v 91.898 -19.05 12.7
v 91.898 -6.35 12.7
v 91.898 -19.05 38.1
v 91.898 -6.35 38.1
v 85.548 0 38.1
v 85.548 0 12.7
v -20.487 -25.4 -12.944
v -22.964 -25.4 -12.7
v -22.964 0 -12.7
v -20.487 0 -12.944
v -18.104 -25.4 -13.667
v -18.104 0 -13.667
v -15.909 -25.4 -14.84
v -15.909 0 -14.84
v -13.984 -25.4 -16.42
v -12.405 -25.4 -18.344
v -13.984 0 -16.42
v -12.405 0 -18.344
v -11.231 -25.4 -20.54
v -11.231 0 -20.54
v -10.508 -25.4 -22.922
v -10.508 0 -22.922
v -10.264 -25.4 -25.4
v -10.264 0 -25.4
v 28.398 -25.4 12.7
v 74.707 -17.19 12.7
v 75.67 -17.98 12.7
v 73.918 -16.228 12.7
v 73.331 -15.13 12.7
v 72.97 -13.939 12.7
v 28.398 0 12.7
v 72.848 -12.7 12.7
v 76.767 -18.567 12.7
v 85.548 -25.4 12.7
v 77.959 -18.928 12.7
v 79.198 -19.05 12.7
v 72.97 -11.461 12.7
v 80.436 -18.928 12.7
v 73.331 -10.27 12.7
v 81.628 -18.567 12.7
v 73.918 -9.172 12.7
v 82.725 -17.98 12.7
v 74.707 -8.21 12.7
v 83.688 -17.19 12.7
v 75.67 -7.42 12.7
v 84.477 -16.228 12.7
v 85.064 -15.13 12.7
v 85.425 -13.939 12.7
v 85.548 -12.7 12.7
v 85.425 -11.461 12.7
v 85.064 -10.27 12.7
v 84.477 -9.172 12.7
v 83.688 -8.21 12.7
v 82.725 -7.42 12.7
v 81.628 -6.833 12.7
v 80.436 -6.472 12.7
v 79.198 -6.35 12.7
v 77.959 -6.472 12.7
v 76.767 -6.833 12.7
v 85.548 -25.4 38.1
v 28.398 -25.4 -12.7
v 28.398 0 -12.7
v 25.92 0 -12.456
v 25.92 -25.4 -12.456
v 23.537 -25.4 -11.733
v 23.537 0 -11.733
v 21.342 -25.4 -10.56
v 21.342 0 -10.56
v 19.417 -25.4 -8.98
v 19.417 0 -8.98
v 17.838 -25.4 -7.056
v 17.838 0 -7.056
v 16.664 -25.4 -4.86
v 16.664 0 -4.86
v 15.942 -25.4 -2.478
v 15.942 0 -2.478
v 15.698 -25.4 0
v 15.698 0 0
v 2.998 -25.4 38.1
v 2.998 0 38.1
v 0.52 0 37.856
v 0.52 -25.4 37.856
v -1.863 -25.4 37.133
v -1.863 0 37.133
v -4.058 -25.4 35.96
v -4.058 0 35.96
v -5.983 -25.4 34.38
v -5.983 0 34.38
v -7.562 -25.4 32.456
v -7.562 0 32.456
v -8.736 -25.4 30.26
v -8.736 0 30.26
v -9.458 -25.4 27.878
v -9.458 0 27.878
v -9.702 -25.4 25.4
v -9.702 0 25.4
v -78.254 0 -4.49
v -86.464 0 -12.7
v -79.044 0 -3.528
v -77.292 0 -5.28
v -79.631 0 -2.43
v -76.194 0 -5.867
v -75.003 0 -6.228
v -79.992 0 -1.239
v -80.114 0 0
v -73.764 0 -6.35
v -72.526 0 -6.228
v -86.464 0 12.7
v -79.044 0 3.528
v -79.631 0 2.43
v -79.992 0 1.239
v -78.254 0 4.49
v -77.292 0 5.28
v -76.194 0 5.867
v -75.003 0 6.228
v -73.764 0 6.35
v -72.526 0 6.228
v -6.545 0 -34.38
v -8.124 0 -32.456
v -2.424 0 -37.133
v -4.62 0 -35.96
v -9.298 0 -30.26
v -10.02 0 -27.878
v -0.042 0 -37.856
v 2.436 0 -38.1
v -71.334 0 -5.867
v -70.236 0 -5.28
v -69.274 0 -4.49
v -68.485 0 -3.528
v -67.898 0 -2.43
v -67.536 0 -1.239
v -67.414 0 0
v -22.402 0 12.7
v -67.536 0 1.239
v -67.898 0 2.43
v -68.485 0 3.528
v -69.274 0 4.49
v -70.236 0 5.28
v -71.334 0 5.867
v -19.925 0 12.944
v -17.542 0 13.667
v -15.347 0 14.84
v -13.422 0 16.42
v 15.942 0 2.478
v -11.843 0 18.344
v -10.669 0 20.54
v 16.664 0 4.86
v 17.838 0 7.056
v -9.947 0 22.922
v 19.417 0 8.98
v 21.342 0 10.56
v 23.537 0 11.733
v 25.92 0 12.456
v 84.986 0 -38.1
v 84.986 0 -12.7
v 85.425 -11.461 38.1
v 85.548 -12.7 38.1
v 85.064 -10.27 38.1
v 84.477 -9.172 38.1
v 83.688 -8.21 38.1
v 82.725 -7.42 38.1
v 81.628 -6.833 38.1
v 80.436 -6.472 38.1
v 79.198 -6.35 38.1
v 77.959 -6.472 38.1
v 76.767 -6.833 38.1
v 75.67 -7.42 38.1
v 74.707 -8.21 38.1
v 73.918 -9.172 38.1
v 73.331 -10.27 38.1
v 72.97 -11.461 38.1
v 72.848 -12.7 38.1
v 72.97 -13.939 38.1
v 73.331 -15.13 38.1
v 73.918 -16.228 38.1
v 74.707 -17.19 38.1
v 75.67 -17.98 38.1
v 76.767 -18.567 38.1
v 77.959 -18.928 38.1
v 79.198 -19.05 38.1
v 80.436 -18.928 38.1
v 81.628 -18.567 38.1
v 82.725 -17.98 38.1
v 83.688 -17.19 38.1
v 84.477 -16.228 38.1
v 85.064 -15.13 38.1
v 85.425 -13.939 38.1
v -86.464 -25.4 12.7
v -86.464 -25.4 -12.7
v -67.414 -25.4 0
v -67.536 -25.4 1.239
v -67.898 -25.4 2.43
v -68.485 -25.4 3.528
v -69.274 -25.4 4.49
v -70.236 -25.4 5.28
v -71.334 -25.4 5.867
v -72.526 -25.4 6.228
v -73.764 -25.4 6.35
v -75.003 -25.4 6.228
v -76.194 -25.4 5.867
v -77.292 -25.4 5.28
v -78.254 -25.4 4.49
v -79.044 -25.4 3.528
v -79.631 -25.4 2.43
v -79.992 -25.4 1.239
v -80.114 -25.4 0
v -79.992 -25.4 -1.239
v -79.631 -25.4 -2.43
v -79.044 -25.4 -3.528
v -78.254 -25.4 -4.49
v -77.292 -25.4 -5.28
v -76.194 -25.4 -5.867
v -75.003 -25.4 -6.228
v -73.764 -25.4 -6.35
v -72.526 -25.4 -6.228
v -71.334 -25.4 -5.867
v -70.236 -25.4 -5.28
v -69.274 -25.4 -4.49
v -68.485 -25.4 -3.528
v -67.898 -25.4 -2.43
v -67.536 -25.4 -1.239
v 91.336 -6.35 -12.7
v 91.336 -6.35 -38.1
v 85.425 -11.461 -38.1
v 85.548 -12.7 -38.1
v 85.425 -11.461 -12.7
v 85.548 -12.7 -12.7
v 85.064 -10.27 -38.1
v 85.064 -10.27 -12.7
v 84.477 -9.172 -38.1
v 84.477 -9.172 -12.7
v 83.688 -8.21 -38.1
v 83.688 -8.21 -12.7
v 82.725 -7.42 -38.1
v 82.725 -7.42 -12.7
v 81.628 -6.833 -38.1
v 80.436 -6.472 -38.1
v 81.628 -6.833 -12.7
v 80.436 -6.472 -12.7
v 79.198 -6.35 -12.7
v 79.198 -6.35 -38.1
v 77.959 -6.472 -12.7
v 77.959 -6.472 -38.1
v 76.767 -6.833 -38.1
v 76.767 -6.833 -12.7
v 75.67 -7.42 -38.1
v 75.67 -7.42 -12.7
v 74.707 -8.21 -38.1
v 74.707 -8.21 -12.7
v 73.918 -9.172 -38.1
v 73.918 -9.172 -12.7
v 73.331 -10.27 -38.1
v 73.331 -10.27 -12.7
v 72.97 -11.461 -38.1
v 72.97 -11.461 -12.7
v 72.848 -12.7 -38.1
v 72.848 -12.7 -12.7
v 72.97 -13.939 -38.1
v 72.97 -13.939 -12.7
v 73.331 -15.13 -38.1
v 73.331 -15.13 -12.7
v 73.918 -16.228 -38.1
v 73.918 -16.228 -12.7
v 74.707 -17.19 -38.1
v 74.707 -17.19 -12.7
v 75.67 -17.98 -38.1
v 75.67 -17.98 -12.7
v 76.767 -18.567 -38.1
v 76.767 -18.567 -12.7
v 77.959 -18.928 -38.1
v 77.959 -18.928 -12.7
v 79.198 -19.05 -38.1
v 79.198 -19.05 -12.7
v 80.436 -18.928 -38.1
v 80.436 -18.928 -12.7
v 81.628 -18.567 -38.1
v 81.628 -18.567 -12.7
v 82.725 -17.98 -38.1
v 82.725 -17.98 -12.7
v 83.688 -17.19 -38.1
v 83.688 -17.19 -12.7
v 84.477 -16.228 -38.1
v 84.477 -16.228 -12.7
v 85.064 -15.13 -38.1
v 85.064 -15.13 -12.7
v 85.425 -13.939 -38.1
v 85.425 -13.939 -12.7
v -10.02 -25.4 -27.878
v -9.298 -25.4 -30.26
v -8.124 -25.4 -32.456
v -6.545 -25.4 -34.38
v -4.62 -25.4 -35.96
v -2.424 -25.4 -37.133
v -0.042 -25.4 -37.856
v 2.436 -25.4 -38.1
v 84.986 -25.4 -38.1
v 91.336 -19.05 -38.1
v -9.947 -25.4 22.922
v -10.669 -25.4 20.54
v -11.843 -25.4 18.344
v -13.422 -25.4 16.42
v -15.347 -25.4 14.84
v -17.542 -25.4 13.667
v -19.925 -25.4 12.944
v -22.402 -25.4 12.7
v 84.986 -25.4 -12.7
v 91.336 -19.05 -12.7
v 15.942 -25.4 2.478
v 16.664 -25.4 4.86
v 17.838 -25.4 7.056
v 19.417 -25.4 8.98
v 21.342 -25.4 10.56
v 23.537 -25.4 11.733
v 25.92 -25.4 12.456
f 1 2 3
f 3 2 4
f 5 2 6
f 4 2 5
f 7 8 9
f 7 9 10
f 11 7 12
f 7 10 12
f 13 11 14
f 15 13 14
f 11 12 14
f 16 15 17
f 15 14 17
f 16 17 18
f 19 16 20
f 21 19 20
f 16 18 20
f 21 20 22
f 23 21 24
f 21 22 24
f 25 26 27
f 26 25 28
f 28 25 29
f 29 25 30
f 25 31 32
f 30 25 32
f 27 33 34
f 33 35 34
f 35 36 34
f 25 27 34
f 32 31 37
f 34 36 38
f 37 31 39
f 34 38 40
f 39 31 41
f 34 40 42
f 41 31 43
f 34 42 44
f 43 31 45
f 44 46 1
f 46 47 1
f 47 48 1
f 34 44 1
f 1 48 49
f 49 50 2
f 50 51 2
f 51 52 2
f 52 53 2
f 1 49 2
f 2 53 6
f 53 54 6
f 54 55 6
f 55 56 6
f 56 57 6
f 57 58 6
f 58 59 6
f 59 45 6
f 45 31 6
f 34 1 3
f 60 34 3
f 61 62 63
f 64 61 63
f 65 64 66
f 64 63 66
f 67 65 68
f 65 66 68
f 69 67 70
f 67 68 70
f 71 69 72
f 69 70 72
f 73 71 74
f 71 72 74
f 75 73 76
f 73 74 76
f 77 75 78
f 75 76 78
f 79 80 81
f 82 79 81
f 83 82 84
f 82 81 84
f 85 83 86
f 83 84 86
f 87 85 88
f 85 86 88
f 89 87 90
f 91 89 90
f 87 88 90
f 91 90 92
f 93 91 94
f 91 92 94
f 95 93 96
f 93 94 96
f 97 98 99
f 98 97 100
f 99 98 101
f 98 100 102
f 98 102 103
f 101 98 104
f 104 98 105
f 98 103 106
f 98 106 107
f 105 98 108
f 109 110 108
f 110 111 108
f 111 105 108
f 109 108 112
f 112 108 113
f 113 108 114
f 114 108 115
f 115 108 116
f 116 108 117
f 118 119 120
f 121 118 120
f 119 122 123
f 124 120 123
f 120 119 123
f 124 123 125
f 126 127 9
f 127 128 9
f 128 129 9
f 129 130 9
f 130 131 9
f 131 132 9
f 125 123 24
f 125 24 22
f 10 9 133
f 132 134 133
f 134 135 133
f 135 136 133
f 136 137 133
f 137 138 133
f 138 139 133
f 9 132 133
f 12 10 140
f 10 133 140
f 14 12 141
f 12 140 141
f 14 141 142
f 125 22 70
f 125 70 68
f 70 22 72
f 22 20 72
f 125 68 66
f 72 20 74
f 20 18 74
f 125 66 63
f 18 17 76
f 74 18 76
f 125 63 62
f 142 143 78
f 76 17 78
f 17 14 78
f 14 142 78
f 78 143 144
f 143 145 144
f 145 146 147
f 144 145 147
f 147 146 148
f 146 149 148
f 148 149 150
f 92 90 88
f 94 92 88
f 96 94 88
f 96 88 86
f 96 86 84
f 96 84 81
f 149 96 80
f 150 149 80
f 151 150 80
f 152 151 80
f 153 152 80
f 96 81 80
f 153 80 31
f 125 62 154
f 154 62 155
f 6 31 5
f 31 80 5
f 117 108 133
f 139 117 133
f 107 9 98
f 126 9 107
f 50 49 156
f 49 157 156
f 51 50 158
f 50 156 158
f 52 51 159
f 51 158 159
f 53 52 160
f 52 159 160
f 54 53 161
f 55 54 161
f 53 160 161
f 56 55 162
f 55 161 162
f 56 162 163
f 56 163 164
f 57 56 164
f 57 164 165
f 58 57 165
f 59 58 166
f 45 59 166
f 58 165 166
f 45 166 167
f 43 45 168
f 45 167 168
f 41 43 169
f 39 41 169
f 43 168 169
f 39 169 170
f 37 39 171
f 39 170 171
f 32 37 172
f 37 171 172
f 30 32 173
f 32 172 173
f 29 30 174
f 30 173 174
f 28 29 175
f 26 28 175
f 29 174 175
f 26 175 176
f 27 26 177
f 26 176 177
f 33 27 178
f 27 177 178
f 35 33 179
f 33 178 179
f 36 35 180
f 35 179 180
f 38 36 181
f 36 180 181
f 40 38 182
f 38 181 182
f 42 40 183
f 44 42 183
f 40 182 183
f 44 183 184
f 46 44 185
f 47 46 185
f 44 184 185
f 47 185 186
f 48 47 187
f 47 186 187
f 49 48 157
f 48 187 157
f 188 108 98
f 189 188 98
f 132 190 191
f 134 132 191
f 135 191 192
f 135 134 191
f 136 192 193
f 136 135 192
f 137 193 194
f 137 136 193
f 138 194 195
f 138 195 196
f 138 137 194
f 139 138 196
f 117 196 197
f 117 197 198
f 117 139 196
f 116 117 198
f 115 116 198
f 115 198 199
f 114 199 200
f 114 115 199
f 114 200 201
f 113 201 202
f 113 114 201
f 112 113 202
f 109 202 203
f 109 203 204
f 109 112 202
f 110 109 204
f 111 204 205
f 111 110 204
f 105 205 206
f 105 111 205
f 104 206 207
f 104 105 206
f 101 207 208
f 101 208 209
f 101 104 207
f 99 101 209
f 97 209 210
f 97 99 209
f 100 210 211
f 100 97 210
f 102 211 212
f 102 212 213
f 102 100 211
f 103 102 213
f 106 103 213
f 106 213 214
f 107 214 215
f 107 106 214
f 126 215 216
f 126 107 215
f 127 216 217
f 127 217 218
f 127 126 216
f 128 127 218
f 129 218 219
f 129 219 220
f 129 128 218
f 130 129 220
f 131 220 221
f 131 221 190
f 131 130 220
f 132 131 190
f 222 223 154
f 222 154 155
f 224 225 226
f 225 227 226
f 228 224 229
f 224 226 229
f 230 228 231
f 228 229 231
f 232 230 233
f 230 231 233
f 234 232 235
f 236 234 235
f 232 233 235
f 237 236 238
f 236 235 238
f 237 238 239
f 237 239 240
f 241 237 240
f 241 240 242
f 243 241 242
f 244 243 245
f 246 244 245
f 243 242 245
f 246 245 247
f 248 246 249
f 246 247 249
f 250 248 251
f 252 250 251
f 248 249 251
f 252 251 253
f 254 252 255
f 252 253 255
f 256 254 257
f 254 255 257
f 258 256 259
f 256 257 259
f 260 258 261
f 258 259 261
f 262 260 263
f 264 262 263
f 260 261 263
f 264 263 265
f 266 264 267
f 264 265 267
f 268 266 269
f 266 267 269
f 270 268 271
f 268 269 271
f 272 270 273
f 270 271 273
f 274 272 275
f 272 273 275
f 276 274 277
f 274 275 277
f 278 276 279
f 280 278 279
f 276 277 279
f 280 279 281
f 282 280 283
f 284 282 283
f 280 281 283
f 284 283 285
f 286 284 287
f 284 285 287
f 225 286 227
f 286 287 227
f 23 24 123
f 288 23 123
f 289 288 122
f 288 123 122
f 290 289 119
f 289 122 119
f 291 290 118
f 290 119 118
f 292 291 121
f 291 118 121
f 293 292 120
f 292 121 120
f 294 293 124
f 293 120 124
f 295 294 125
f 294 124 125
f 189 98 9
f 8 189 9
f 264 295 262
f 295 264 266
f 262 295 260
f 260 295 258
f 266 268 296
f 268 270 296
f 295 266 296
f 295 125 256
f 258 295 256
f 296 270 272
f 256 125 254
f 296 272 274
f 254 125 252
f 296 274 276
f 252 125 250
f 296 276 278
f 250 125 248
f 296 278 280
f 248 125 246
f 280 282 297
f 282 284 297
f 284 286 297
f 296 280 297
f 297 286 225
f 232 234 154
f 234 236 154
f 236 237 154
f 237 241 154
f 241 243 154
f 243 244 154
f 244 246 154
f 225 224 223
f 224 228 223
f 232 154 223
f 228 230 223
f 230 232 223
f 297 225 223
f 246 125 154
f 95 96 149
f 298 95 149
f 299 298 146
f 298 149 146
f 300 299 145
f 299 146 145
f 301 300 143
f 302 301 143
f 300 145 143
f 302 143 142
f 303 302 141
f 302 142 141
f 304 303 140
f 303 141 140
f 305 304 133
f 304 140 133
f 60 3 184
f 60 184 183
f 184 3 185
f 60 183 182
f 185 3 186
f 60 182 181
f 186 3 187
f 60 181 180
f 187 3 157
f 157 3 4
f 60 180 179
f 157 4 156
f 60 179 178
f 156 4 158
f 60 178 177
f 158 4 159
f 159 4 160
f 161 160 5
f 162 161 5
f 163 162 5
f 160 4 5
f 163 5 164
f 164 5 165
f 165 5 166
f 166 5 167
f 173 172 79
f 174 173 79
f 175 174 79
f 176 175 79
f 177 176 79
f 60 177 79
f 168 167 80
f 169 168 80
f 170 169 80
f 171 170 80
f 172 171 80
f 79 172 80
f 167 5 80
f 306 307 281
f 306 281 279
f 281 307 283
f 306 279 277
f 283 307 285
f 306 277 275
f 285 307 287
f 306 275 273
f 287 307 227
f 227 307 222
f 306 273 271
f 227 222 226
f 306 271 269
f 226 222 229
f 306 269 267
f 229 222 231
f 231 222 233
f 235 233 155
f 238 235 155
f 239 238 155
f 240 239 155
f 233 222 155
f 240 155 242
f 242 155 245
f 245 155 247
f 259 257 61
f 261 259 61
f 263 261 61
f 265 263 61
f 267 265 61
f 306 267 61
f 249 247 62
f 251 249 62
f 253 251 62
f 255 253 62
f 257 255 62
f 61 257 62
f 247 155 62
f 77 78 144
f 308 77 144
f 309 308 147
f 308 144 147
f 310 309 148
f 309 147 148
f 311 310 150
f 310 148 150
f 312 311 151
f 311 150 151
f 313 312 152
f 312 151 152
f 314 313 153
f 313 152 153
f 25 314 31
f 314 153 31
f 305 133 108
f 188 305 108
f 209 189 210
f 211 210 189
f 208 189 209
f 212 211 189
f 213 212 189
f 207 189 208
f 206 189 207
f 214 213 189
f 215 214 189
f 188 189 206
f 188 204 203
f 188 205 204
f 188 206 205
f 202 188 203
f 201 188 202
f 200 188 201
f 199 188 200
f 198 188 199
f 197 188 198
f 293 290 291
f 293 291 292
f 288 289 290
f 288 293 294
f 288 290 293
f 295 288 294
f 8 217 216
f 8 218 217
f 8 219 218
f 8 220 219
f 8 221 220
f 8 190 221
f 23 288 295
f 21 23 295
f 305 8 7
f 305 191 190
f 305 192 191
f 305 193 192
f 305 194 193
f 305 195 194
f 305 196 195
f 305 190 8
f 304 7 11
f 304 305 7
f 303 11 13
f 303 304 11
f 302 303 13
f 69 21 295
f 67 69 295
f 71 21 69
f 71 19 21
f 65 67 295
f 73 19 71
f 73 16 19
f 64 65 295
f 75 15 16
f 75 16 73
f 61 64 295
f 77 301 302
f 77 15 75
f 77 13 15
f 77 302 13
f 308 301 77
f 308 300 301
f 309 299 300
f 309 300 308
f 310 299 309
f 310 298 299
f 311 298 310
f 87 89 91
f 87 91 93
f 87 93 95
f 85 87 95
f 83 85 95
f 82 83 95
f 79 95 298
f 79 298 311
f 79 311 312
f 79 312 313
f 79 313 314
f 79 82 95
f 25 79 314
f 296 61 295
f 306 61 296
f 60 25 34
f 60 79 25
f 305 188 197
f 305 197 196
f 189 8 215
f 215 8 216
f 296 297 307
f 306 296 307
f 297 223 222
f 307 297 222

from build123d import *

# Parameters (mm, degrees)
F0_R     = 6.35
F1_DEPTH = 25.4
F2_R     = 6.35
F3_DEPTH = 44.45
F4_SIZE  = 6.35


with BuildPart() as f1:
    # F0 (on Front) → F1 (new body)
    with BuildSketch(Plane.XZ):
        with BuildLine():
            Line((-22.402494, 12.7), (-86.464335, 12.7))
            Line((-86.464335, 12.7), (-86.464335, -12.7))
            Line((-86.464335, -12.7), (-22.964335, -12.7))
            ThreePointArc((-22.964335, -12.7), (-13.984079, -16.419744), (-10.264335, -25.4))
            ThreePointArc((-10.264335, -25.4), (-6.544591, -34.380256), (2.435665, -38.1))
            Line((2.435665, -38.1), (91.335665, -38.1))
            Line((91.335665, -38.1), (91.335665, -12.7))
            Line((91.335665, -12.7), (28.397506, -12.7))
            ThreePointArc((28.397506, -12.7), (19.41725, -8.980256), (15.697506, 0))
            ThreePointArc((15.697506, 0), (19.41725, 8.980256), (28.397506, 12.7))
            Line((28.397506, 12.7), (91.897506, 12.7))
            Line((91.897506, 12.7), (91.897506, 38.1))
            Line((91.897506, 38.1), (2.997506, 38.1))
            ThreePointArc((2.997506, 38.1), (-5.98275, 34.380256), (-9.702494, 25.4))
            ThreePointArc((-9.702494, 25.4), (-13.422238, 16.419744), (-22.402494, 12.7))
        make_face()
        with Locations((-73.764335, 0)):
            Circle(F0_R, mode=Mode.SUBTRACT)
    extrude(amount=F1_DEPTH)

    # F2 (on Top) → F3 (cut, symmetric)
    with BuildSketch(Plane.XY):
        with Locations((79.197506, -12.7)):
            Circle(F2_R)
    extrude(amount=F3_DEPTH, both=True, mode=Mode.SUBTRACT)

    # F4
    f4_edges = [f1.edges().sort_by_distance(p)[0] for p in [
        (91.897506, 0, 25.4),
        (91.335665, 0, -25.4),
        (91.897506, -25.4, 25.4),
        (91.335665, -25.4, -25.4),
    ]]
    chamfer(f4_edges, length=F4_SIZE)


solid = f1.part
